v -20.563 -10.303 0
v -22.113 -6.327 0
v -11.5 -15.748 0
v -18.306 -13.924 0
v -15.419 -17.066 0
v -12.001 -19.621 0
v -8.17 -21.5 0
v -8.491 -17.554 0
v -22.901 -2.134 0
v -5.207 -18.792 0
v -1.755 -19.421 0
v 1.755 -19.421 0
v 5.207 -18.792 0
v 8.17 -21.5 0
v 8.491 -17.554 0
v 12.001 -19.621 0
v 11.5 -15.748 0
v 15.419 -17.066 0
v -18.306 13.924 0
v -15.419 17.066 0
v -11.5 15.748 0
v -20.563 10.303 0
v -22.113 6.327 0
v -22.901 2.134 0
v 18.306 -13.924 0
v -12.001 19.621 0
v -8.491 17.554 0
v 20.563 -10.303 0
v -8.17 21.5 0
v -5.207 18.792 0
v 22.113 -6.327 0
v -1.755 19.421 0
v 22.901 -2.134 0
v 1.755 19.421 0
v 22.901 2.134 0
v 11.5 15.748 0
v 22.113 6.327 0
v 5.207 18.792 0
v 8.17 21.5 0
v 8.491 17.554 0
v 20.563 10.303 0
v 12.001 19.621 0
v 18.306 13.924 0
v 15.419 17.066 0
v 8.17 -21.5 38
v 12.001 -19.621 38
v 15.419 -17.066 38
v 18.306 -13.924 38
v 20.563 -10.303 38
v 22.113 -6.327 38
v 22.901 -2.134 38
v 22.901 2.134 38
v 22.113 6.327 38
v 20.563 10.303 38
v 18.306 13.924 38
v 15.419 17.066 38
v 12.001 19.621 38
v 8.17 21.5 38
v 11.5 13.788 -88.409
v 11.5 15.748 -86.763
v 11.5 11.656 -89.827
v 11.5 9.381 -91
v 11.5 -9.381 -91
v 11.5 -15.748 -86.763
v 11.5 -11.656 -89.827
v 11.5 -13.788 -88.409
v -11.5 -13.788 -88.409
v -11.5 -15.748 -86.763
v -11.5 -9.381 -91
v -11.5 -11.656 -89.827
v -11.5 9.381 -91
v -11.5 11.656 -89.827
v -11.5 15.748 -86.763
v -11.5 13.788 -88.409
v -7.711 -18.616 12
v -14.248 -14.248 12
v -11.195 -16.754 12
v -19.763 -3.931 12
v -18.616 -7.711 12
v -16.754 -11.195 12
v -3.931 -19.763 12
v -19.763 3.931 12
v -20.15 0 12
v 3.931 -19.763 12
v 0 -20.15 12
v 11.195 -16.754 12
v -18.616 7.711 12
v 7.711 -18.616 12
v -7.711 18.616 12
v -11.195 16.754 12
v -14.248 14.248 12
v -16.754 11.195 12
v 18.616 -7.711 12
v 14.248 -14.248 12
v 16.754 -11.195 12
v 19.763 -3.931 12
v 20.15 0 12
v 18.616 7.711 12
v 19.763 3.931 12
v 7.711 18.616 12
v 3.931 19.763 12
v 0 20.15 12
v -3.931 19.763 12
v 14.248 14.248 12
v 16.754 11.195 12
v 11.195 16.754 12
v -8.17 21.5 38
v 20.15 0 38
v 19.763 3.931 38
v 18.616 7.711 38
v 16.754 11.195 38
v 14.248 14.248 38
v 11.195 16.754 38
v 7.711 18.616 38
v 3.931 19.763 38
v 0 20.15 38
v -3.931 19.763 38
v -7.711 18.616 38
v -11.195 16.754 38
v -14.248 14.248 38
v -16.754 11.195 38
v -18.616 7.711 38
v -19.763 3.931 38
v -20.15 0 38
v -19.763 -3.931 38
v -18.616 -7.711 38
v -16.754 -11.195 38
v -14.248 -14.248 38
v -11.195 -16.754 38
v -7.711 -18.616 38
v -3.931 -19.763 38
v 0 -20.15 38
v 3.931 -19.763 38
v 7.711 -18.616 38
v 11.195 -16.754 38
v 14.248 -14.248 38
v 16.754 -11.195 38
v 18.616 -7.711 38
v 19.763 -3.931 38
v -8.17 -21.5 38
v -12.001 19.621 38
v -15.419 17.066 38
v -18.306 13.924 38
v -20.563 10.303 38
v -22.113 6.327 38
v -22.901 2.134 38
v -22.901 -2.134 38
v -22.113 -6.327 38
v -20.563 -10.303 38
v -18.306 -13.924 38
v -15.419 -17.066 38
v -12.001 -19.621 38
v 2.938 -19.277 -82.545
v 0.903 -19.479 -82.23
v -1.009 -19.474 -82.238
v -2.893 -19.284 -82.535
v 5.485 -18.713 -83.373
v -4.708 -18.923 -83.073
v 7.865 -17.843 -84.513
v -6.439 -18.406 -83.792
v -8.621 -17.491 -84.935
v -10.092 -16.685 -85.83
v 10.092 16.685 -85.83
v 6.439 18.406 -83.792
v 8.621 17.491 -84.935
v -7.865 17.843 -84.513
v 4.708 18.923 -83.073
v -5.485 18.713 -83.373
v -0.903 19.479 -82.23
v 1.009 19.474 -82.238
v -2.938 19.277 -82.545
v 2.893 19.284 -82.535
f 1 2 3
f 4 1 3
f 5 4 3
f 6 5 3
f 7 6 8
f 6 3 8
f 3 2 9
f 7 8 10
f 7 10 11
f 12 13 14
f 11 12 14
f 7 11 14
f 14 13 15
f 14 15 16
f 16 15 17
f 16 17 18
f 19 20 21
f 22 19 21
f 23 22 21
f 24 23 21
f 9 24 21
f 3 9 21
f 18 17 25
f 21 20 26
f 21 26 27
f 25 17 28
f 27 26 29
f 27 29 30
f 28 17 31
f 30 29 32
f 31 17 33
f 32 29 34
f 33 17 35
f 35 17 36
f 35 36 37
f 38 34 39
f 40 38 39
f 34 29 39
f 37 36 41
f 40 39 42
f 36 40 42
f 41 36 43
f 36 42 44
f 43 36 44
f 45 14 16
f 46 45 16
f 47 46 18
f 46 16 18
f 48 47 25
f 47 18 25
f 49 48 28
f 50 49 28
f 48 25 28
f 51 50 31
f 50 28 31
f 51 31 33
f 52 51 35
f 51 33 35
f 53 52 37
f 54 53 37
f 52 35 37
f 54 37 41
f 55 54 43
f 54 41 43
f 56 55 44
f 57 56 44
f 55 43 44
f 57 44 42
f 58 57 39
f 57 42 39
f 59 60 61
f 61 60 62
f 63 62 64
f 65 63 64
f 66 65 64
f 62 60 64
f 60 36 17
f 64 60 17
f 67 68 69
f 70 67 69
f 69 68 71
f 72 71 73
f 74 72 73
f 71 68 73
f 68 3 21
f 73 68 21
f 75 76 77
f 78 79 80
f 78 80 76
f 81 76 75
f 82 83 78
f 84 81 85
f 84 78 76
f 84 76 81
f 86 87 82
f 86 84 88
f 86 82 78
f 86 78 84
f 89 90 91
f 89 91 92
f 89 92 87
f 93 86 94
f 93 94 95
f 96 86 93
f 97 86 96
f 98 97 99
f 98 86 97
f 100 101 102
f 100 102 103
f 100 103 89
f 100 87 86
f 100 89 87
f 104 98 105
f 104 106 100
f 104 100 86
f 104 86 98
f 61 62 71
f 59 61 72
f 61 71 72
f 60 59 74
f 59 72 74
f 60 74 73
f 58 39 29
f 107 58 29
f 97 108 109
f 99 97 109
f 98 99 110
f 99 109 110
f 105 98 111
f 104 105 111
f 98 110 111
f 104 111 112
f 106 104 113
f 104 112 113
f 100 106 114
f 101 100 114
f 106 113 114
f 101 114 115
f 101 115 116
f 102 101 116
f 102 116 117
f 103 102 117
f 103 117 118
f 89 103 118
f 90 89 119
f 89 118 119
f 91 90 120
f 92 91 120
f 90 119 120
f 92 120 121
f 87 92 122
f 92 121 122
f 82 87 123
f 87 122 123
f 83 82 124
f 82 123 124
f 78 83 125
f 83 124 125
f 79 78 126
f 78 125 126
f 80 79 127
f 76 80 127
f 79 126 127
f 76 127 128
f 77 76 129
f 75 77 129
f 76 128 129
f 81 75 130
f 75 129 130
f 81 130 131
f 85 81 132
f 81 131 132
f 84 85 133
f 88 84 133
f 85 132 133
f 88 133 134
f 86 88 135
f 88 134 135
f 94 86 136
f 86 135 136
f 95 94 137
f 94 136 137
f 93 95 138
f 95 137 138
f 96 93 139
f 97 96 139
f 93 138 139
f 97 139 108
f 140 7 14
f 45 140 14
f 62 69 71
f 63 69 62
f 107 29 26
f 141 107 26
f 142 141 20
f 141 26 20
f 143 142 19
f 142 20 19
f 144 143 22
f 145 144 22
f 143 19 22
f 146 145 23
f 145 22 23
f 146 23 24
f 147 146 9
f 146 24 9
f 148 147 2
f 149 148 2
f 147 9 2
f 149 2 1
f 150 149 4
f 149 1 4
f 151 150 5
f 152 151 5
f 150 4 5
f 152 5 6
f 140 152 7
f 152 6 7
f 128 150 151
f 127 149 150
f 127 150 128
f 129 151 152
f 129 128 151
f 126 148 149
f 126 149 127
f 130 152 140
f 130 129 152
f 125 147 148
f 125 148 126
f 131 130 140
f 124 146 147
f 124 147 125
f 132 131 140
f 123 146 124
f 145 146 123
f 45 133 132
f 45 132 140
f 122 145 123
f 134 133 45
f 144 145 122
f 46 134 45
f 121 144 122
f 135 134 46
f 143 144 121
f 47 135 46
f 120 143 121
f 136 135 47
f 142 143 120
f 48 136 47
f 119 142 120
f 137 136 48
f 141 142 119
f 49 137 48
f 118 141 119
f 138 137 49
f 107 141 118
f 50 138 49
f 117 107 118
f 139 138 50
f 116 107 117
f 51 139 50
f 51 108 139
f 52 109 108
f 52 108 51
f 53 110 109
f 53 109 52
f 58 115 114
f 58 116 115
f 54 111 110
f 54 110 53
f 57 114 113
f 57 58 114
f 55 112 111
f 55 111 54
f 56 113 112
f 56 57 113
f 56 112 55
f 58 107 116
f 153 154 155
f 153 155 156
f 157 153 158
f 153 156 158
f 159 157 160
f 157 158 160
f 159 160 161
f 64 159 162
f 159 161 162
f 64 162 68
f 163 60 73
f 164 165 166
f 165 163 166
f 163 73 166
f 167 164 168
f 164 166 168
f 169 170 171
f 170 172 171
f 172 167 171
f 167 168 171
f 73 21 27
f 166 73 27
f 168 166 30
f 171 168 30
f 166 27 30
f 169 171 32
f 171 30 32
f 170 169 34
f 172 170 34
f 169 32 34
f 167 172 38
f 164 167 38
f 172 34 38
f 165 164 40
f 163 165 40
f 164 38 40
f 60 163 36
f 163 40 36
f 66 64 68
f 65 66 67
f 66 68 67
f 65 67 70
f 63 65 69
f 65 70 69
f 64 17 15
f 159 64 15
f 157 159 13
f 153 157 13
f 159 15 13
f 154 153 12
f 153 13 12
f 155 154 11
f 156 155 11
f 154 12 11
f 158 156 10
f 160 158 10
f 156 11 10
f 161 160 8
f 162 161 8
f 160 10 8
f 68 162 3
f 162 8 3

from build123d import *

# Parameters (mm, degrees)
F1_DEPTH = 38
F2_R     = 20.15
F3_DEPTH = 26
F5_DEPTH = 91
F7_DEPTH = 34.5010000087


with BuildPart() as f1:
    # F0 (on Top) → F1 (new body)
    with BuildSketch(Plane.XY):
        with BuildLine():
            Line((8.1700673192, 21.5), (-8.1700673192, 21.5))
            ThreePointArc((-8.1700673192, 21.5), (-23, 0), (-8.1700673192, -21.5))
            Line((-8.1700673192, -21.5), (8.1700673192, -21.5))
            ThreePointArc((8.1700673192, -21.5), (23, 0), (8.1700673192, 21.5))
        make_face()
    extrude(amount=F1_DEPTH)

    # F2 (on face) → F3 (cut)
    with BuildSketch(Plane.XY.offset(38)):
        Circle(F2_R)
    extrude(amount=-F3_DEPTH, mode=Mode.SUBTRACT)

    # F4 (on face) → F5 (join)
    with BuildSketch(Plane(origin=(0, 0, 0), x_dir=(1, 0, 0), z_dir=(0, 0, -1))):
        with BuildLine():
            Line((11.4999999936, -15.7480157527), (11.5000000064, 15.7480157434))
            ThreePointArc((11.5000000064, 15.7480157434), (7.9e-09, 19.5), (-11.4999999936, 15.7480157527))
            Line((-11.4999999936, 15.7480157527), (-11.5000000064, -15.7480157434))
            ThreePointArc((-11.5000000064, -15.7480157434), (-7.9e-09, -19.5), (11.4999999936, -15.7480157527))
        make_face()
    extrude(amount=F5_DEPTH)

    # F6 (on face) → F7 (cut, through all)
    with BuildSketch(Plane(origin=(-11.5, -4.6e-09, 0), x_dir=(4e-10, -1, 0), z_dir=(-1, -4e-10, 0))):
        with BuildLine():
            ThreePointArc((-9.3808315196, -91), (-12.7417686292, -89.1480372937), (-15.748015748, -86.7630546142))
            Line((-15.748015748, -86.7630546142), (-15.748015748, -91))
            Line((-15.748015748, -91), (-9.3808315196, -91))
        make_face()
        with BuildLine():
            ThreePointArc((15.748015748, -86.7630546142), (12.7417686292, -89.1480372937), (9.3808315196, -91))
            Line((9.3808315196, -91), (15.748015748, -91))
            Line((15.748015748, -91), (15.748015748, -86.7630546142))
        make_face()
        with BuildLine():
            ThreePointArc((-15.748015748, -86.7630546142), (-21.1092913453, -79.1322406285), (-23, -70))
            Line((-23, -70), (-29.5417029411, -96.2313264608))
            Line((-29.5417029411, -96.2313264608), (26.6386214644, -96.2313264608))
            Line((26.6386214644, -96.2313264608), (23, -70))
            ThreePointArc((23, -70), (21.1092913453, -79.1322406285), (15.748015748, -86.7630546142))
            Line((15.748015748, -86.7630546142), (15.748015748, -91))
            Line((15.748015748, -91), (9.3808315196, -91))
            ThreePointArc((9.3808315196, -91), (0, -93), (-9.3808315196, -91))
            Line((-9.3808315196, -91), (-15.748015748, -91))
            Line((-15.748015748, -91), (-15.748015748, -86.7630546142))
        make_face()
    extrude(amount=-F7_DEPTH, mode=Mode.SUBTRACT)


solid = f1.part
